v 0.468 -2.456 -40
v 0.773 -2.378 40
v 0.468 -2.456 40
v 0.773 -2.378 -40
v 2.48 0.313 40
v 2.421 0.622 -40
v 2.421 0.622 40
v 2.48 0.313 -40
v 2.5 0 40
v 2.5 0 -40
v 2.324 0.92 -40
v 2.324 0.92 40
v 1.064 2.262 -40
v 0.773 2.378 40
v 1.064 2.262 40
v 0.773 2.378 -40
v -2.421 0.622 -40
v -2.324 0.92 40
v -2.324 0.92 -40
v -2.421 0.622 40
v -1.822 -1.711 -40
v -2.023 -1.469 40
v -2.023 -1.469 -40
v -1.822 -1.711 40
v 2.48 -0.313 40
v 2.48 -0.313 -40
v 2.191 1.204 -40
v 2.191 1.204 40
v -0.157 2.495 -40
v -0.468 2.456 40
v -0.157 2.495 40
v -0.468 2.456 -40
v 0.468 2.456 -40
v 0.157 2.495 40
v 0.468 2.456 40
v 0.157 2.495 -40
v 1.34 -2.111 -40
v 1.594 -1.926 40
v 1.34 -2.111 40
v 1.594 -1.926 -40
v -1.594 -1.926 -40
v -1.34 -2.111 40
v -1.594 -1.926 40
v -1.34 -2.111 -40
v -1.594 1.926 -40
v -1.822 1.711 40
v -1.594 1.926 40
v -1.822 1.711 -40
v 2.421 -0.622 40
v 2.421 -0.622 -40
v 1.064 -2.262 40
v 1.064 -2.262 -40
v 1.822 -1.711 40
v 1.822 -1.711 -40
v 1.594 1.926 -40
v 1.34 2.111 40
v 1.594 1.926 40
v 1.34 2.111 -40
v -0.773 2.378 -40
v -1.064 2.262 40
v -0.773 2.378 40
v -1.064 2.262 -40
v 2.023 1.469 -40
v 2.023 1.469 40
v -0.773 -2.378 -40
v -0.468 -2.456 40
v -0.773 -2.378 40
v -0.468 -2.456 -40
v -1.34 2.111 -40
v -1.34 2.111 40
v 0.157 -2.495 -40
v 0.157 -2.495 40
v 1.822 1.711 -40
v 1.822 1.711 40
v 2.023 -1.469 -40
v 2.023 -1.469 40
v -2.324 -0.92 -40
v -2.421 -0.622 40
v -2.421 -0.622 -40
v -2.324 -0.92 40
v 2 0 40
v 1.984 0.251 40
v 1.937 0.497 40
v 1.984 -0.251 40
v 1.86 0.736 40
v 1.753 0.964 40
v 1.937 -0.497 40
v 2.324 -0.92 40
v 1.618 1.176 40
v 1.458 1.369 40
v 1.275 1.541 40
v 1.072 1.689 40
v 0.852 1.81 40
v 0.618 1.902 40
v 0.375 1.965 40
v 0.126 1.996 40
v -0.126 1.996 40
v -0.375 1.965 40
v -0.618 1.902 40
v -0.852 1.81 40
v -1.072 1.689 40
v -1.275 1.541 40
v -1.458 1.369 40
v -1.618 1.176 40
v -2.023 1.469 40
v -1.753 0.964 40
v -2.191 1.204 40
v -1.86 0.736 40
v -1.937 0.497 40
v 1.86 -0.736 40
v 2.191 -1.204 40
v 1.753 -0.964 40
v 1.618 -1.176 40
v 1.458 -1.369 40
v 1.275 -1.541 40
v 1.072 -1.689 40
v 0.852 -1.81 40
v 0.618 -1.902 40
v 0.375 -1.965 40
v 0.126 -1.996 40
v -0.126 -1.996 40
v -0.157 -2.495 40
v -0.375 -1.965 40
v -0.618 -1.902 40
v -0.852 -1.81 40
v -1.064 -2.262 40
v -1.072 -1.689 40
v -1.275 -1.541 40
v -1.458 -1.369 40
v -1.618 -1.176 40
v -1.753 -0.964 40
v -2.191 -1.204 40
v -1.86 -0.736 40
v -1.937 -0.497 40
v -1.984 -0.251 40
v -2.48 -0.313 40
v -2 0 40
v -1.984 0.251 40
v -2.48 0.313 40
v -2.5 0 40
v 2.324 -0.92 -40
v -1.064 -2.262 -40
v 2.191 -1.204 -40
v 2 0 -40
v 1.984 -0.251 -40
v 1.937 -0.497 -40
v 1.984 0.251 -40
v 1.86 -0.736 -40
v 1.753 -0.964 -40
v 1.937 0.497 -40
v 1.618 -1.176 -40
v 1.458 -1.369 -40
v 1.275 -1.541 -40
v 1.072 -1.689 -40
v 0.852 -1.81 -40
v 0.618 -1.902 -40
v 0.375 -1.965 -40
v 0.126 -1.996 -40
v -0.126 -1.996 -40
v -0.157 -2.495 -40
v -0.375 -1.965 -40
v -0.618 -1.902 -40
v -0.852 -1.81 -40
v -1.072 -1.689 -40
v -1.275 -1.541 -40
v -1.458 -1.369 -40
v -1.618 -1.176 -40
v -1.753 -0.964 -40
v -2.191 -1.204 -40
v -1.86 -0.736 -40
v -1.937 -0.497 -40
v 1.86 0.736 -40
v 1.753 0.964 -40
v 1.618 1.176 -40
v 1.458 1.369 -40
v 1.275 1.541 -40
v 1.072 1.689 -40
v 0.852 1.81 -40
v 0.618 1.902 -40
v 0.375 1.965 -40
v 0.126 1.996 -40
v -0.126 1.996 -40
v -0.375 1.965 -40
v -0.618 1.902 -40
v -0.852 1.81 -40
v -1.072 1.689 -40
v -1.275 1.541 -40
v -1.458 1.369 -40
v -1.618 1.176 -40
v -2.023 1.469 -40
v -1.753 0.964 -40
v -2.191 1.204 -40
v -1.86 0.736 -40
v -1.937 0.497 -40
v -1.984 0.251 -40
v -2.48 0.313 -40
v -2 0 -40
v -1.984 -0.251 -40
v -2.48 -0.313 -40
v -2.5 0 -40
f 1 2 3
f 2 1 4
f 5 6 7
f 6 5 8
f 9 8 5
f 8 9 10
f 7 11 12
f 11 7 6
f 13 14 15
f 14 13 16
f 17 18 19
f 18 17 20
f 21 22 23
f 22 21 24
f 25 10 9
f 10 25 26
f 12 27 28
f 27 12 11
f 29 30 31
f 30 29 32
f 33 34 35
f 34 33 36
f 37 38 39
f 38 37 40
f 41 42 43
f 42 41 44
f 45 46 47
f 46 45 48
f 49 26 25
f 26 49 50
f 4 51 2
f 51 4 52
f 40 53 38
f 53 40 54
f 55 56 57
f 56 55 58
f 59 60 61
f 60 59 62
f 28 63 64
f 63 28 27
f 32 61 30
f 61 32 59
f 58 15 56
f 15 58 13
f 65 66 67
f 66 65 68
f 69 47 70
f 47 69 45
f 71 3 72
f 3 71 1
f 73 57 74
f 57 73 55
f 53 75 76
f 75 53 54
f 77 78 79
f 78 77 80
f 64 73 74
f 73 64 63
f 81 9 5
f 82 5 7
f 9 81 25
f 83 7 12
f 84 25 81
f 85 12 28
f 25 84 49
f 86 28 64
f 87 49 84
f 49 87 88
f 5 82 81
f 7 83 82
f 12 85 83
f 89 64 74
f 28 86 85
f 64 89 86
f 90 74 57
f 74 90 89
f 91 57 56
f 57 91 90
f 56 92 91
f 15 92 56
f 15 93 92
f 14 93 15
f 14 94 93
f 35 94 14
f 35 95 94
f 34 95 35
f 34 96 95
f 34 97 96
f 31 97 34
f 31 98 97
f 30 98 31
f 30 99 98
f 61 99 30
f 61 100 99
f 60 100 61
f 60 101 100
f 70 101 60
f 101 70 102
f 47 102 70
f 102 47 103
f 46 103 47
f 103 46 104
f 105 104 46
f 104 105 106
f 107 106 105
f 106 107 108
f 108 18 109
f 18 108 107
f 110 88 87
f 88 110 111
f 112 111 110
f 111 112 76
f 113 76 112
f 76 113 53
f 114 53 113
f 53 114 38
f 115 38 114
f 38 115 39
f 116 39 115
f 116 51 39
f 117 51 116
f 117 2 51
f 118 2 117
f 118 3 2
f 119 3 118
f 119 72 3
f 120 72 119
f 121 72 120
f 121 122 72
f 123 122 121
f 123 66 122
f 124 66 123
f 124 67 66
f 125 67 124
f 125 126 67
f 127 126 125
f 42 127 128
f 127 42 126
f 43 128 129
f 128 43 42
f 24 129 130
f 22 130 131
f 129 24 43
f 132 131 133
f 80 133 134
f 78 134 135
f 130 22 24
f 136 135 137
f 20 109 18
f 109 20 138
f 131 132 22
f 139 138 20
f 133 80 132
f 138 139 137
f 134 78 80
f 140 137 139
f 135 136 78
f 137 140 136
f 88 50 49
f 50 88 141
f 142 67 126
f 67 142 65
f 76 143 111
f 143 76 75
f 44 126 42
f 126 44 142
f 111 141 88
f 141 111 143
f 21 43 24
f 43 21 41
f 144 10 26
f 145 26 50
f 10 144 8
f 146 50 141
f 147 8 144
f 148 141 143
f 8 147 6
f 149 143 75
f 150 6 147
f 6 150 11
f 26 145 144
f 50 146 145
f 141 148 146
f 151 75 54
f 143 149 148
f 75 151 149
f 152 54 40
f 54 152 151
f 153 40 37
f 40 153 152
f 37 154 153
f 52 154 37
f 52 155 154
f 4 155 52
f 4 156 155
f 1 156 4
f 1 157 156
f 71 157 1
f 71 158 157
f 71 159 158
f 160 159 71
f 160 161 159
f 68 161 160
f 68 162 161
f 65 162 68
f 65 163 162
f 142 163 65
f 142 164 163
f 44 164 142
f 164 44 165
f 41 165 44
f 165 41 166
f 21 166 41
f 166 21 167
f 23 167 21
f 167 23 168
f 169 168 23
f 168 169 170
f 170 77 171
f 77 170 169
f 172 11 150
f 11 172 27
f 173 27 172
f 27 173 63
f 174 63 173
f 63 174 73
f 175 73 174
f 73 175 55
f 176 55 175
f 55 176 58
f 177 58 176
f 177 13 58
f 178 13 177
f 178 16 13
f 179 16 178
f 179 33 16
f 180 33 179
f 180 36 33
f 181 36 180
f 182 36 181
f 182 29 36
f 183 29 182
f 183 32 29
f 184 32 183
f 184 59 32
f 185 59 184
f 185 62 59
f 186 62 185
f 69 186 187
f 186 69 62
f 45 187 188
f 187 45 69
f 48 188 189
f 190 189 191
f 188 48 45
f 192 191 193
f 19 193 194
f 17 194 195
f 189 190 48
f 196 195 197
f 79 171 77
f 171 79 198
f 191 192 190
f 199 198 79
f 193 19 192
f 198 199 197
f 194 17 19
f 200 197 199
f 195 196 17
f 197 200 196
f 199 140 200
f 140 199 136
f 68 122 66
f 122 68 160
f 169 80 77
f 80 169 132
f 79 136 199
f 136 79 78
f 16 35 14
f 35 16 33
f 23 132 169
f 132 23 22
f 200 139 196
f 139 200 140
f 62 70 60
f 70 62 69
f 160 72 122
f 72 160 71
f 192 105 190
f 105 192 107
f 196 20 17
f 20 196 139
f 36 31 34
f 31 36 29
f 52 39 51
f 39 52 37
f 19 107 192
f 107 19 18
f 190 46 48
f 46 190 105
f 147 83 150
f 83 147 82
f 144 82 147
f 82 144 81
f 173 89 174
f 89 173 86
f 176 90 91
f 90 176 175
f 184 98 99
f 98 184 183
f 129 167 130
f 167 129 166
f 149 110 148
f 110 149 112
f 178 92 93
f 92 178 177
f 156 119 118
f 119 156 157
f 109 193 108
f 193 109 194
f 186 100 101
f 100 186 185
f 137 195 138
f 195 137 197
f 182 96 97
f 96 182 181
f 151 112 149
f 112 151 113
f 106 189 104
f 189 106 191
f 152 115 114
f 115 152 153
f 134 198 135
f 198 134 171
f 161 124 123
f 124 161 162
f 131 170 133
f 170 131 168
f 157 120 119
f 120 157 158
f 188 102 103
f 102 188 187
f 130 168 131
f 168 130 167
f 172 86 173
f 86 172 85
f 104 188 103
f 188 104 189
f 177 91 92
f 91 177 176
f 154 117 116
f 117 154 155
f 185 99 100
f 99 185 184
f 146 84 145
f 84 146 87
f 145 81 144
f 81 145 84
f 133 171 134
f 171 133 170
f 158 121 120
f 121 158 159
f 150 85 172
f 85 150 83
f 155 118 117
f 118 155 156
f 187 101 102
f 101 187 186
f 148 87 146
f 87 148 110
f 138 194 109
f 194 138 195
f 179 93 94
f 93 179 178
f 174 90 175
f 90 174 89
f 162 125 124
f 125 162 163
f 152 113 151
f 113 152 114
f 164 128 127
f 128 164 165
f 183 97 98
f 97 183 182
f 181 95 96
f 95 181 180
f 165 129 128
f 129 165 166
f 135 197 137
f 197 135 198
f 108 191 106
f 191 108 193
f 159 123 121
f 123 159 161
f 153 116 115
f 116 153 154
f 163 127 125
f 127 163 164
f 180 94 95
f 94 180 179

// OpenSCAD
$fn = 50;


difference() {
	union() {
		translate(v = [0, 0, -40.0000000000]) {
			cylinder(h = 80, r = 2.5000000000);
		}
	}
	union() {
		translate(v = [0, 0, -100.0000000000]) {
			cylinder(h = 200, r = 2.0000000000);
		}
	}
}
